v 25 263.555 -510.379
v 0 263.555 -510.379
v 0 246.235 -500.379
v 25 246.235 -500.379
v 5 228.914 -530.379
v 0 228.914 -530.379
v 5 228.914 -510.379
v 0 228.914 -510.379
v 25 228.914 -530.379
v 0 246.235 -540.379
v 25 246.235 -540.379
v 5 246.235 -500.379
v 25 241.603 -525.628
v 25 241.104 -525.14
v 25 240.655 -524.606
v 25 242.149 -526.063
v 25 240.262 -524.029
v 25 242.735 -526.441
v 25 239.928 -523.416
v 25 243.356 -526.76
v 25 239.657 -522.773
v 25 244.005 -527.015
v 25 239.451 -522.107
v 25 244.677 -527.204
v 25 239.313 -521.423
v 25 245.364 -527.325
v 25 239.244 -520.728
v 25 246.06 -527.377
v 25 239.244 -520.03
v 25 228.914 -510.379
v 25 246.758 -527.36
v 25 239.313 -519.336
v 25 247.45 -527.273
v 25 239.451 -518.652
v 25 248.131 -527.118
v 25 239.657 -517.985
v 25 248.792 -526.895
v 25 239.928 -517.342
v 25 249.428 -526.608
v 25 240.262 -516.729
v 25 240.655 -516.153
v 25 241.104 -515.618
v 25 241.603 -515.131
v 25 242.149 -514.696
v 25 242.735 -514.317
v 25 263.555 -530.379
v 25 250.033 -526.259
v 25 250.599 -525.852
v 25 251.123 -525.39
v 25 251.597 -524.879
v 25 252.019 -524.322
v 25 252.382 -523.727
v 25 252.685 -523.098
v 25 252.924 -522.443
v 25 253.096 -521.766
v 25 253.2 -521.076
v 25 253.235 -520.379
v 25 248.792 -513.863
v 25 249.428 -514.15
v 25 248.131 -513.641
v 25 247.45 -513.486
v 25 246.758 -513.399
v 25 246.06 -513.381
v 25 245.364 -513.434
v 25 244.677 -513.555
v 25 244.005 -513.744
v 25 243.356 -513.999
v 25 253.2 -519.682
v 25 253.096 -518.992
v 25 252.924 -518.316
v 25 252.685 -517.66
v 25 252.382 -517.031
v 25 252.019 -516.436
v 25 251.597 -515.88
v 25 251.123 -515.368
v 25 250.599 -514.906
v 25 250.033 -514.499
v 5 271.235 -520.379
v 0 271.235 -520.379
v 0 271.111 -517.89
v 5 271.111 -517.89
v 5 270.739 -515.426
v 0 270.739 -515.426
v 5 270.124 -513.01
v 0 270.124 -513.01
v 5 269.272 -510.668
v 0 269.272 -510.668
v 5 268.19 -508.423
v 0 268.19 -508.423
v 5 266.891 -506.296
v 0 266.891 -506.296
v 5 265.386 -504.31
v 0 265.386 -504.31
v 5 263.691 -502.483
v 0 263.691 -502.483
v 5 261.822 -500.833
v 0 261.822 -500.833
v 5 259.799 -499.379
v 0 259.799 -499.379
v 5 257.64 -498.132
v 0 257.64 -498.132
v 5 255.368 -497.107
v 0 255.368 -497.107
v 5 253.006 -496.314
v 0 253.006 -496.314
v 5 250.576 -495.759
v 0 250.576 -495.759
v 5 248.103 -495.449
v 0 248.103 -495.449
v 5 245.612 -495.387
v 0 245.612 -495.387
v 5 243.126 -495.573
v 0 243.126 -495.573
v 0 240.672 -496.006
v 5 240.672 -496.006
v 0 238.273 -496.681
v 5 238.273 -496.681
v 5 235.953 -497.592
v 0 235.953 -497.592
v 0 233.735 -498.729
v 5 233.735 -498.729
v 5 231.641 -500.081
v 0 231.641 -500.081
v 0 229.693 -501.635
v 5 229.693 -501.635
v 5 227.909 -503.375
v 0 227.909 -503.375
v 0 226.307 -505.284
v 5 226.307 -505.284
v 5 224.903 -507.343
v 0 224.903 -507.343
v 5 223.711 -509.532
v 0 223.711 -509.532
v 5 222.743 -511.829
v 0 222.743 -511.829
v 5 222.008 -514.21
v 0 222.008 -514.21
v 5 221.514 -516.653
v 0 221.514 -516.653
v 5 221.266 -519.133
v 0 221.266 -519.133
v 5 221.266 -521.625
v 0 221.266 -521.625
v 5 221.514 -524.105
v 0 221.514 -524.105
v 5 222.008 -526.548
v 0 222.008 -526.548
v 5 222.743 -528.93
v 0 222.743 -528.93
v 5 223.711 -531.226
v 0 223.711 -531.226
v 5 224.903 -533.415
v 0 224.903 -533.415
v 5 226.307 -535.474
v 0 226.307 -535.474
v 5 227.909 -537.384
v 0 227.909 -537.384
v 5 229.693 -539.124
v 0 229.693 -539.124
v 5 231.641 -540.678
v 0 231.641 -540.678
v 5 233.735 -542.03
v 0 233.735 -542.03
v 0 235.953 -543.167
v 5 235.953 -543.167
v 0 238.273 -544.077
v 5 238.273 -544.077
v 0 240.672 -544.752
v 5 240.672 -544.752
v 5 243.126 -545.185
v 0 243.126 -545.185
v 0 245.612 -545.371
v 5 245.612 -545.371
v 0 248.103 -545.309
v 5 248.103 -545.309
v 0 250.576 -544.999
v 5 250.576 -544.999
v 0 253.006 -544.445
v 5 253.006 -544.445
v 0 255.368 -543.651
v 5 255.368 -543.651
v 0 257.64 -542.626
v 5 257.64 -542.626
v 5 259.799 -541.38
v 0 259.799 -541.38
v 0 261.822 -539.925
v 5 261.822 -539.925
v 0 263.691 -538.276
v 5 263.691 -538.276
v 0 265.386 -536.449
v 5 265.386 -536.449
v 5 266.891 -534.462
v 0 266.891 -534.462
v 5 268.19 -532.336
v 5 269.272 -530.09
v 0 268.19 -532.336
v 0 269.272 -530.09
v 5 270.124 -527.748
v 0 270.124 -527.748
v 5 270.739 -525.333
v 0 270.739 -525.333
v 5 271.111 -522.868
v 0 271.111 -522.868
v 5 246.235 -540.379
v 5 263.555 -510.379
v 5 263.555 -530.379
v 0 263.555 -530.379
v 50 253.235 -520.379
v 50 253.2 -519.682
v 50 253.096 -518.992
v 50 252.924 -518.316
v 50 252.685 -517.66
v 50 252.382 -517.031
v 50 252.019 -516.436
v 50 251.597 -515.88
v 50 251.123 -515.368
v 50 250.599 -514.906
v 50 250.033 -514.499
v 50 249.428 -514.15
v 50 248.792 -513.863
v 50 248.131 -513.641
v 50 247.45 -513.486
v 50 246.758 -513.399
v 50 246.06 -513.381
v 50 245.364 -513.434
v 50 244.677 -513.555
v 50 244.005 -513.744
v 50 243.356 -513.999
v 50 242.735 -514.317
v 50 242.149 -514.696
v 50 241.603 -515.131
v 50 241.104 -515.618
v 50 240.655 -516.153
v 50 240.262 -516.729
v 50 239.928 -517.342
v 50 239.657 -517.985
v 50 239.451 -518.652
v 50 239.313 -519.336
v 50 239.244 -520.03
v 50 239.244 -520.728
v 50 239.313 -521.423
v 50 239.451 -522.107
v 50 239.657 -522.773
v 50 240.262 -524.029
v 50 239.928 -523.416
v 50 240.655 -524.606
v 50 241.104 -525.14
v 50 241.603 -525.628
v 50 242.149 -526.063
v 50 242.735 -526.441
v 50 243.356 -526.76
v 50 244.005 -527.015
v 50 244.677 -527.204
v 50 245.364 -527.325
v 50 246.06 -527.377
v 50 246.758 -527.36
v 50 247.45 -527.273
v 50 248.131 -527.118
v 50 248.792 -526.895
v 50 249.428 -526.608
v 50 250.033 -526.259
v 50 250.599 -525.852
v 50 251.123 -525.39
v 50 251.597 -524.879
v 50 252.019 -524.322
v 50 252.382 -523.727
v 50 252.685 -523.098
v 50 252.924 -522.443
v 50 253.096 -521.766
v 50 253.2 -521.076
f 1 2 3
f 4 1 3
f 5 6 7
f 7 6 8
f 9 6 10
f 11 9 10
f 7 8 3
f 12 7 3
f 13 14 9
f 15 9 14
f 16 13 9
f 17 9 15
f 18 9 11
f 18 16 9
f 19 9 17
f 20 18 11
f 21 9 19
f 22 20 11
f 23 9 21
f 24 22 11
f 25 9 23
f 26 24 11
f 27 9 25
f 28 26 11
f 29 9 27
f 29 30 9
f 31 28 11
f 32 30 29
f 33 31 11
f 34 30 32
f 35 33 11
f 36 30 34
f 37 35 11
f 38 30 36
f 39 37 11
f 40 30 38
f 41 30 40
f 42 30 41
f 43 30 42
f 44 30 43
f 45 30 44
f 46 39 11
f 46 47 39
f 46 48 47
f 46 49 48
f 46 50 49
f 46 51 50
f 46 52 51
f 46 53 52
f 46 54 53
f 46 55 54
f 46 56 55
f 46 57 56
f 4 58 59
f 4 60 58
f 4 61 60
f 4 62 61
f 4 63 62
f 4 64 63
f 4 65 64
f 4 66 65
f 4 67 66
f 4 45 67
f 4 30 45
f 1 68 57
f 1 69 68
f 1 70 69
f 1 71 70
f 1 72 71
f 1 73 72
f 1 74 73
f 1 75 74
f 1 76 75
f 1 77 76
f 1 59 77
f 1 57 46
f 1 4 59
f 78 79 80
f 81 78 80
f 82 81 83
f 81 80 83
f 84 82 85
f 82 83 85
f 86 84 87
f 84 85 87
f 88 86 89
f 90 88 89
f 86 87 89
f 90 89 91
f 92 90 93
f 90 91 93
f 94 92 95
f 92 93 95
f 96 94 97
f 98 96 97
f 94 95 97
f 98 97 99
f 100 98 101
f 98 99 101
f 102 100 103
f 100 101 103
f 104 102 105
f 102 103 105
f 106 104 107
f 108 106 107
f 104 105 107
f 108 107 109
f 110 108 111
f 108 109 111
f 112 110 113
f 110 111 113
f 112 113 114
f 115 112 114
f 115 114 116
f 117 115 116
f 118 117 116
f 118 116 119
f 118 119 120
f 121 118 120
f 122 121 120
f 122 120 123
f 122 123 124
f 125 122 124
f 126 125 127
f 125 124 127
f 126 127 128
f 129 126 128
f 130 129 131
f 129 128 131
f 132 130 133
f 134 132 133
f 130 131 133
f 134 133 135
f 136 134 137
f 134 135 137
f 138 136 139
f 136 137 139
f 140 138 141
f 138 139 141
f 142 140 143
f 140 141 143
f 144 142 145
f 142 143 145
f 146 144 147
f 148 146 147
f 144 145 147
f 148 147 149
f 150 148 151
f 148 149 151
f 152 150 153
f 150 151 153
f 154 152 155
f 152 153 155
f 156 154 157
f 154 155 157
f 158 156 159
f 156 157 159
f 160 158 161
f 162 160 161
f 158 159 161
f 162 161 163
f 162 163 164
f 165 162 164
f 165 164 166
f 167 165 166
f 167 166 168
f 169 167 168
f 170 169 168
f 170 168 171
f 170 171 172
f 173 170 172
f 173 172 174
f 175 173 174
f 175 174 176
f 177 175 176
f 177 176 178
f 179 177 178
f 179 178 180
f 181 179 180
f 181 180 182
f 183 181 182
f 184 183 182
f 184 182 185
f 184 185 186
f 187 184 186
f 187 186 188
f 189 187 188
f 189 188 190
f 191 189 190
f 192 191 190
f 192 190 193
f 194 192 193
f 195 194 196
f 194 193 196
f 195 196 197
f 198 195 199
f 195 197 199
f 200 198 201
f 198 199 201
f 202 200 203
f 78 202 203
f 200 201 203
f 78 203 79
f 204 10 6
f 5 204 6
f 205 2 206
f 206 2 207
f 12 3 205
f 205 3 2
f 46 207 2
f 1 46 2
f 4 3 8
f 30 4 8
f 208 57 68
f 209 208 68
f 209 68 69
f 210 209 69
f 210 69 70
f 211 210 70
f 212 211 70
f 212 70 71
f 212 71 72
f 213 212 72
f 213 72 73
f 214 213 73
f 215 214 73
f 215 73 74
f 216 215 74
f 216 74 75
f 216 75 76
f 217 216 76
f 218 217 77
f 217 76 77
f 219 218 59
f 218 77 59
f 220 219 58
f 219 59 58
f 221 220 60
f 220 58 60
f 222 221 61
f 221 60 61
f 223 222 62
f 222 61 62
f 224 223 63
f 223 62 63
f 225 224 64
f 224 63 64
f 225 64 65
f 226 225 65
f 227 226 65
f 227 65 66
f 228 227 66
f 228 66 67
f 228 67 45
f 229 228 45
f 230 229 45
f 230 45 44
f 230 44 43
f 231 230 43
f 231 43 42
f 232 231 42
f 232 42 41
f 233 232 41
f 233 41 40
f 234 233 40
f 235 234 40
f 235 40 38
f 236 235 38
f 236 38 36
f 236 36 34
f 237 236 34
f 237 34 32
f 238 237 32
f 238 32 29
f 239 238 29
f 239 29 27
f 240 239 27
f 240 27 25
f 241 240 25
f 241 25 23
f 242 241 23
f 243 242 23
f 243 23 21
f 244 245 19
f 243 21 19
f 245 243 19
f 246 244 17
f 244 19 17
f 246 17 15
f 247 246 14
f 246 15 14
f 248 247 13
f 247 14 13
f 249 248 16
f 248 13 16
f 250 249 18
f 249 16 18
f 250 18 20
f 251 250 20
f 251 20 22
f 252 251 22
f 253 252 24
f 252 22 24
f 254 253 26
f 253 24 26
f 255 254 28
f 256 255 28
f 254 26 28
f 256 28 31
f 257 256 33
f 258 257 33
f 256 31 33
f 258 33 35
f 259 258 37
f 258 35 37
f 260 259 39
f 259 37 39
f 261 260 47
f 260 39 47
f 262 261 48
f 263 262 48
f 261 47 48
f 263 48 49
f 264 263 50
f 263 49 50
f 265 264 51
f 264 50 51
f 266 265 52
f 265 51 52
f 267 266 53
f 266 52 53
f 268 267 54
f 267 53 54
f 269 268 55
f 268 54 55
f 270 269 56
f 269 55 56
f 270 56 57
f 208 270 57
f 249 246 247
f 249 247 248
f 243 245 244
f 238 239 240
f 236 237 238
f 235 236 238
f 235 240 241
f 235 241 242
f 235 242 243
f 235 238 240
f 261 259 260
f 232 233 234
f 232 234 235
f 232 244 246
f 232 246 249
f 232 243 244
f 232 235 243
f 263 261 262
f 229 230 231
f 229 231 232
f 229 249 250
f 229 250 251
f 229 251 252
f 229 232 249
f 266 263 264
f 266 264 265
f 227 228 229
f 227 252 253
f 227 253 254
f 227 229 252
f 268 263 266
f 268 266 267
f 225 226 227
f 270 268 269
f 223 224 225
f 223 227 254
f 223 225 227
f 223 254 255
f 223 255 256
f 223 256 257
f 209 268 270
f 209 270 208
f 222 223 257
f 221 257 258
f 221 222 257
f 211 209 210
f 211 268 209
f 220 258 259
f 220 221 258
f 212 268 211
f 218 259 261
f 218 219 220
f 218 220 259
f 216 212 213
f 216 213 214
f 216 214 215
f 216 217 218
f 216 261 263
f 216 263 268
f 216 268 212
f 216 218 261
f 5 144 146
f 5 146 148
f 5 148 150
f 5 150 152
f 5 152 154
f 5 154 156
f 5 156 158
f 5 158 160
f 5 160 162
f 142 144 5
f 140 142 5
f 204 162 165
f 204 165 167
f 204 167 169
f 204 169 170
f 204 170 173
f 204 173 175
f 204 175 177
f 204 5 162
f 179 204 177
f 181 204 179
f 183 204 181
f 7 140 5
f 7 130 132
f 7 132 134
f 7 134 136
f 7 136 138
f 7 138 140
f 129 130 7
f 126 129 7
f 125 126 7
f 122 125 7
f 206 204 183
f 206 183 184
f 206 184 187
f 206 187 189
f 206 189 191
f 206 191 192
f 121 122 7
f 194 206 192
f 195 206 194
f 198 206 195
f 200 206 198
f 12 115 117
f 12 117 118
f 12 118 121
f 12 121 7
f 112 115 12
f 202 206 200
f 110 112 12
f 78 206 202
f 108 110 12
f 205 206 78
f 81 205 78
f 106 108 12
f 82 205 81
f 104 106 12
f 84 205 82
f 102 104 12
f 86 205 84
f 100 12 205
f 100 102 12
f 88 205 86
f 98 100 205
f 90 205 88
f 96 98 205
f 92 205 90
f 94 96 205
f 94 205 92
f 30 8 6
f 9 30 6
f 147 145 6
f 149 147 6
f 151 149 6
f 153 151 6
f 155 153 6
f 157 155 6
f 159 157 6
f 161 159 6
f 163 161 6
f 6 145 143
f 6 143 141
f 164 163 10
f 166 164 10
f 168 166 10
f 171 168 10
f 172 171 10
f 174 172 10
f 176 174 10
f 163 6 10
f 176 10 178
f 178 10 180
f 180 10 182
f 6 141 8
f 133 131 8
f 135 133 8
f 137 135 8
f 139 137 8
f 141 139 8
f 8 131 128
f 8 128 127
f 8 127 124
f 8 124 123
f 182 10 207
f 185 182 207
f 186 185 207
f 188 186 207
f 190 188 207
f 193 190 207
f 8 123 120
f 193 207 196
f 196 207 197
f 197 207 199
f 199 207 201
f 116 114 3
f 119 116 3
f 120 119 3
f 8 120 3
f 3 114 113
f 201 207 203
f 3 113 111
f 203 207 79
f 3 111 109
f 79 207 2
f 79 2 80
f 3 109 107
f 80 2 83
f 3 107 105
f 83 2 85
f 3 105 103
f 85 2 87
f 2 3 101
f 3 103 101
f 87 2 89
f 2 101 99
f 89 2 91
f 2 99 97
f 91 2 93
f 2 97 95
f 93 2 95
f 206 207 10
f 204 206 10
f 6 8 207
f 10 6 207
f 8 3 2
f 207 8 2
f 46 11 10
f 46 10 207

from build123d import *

# Parameters (mm, degrees)
F0_R     = 7
F1_DEPTH = 50
F2_DEPTH = 25
F0_R_2   = 25
F3_DEPTH = 5


with BuildPart() as f1:
    # F0 (on Right) → F1 (new body)
    with BuildSketch(Plane.YZ):
        with Locations((246.234893, -520.379218)):
            Circle(F0_R)
    extrude(amount=F1_DEPTH)

    # F0 (on Right) → F2 (join)
    with BuildSketch(Plane.YZ):
        Polygon((246.234893, -500.379218), (228.914385, -510.379218), (228.914385, -530.379218), (246.234893, -540.379218), (263.555401, -530.379218), (263.555401, -510.379218), align=None)
        with Locations((246.234893, -520.379218)):
            Circle(F0_R, mode=Mode.SUBTRACT)
    extrude(amount=F2_DEPTH)


with BuildPart() as f3:
    # F0 (on Right) → F3 (new body)
    with BuildSketch(Plane.YZ):
        with Locations((246.234893, -520.379218)):
            Circle(F0_R_2)
        Polygon((228.914385, -530.379218), (228.914385, -510.379218), (246.234893, -500.379218), (263.555401, -510.379218), (263.555401, -530.379218), (246.234893, -540.379218), align=None, mode=Mode.SUBTRACT)
    extrude(amount=F3_DEPTH)


solid = Compound([f1.part, f3.part])
